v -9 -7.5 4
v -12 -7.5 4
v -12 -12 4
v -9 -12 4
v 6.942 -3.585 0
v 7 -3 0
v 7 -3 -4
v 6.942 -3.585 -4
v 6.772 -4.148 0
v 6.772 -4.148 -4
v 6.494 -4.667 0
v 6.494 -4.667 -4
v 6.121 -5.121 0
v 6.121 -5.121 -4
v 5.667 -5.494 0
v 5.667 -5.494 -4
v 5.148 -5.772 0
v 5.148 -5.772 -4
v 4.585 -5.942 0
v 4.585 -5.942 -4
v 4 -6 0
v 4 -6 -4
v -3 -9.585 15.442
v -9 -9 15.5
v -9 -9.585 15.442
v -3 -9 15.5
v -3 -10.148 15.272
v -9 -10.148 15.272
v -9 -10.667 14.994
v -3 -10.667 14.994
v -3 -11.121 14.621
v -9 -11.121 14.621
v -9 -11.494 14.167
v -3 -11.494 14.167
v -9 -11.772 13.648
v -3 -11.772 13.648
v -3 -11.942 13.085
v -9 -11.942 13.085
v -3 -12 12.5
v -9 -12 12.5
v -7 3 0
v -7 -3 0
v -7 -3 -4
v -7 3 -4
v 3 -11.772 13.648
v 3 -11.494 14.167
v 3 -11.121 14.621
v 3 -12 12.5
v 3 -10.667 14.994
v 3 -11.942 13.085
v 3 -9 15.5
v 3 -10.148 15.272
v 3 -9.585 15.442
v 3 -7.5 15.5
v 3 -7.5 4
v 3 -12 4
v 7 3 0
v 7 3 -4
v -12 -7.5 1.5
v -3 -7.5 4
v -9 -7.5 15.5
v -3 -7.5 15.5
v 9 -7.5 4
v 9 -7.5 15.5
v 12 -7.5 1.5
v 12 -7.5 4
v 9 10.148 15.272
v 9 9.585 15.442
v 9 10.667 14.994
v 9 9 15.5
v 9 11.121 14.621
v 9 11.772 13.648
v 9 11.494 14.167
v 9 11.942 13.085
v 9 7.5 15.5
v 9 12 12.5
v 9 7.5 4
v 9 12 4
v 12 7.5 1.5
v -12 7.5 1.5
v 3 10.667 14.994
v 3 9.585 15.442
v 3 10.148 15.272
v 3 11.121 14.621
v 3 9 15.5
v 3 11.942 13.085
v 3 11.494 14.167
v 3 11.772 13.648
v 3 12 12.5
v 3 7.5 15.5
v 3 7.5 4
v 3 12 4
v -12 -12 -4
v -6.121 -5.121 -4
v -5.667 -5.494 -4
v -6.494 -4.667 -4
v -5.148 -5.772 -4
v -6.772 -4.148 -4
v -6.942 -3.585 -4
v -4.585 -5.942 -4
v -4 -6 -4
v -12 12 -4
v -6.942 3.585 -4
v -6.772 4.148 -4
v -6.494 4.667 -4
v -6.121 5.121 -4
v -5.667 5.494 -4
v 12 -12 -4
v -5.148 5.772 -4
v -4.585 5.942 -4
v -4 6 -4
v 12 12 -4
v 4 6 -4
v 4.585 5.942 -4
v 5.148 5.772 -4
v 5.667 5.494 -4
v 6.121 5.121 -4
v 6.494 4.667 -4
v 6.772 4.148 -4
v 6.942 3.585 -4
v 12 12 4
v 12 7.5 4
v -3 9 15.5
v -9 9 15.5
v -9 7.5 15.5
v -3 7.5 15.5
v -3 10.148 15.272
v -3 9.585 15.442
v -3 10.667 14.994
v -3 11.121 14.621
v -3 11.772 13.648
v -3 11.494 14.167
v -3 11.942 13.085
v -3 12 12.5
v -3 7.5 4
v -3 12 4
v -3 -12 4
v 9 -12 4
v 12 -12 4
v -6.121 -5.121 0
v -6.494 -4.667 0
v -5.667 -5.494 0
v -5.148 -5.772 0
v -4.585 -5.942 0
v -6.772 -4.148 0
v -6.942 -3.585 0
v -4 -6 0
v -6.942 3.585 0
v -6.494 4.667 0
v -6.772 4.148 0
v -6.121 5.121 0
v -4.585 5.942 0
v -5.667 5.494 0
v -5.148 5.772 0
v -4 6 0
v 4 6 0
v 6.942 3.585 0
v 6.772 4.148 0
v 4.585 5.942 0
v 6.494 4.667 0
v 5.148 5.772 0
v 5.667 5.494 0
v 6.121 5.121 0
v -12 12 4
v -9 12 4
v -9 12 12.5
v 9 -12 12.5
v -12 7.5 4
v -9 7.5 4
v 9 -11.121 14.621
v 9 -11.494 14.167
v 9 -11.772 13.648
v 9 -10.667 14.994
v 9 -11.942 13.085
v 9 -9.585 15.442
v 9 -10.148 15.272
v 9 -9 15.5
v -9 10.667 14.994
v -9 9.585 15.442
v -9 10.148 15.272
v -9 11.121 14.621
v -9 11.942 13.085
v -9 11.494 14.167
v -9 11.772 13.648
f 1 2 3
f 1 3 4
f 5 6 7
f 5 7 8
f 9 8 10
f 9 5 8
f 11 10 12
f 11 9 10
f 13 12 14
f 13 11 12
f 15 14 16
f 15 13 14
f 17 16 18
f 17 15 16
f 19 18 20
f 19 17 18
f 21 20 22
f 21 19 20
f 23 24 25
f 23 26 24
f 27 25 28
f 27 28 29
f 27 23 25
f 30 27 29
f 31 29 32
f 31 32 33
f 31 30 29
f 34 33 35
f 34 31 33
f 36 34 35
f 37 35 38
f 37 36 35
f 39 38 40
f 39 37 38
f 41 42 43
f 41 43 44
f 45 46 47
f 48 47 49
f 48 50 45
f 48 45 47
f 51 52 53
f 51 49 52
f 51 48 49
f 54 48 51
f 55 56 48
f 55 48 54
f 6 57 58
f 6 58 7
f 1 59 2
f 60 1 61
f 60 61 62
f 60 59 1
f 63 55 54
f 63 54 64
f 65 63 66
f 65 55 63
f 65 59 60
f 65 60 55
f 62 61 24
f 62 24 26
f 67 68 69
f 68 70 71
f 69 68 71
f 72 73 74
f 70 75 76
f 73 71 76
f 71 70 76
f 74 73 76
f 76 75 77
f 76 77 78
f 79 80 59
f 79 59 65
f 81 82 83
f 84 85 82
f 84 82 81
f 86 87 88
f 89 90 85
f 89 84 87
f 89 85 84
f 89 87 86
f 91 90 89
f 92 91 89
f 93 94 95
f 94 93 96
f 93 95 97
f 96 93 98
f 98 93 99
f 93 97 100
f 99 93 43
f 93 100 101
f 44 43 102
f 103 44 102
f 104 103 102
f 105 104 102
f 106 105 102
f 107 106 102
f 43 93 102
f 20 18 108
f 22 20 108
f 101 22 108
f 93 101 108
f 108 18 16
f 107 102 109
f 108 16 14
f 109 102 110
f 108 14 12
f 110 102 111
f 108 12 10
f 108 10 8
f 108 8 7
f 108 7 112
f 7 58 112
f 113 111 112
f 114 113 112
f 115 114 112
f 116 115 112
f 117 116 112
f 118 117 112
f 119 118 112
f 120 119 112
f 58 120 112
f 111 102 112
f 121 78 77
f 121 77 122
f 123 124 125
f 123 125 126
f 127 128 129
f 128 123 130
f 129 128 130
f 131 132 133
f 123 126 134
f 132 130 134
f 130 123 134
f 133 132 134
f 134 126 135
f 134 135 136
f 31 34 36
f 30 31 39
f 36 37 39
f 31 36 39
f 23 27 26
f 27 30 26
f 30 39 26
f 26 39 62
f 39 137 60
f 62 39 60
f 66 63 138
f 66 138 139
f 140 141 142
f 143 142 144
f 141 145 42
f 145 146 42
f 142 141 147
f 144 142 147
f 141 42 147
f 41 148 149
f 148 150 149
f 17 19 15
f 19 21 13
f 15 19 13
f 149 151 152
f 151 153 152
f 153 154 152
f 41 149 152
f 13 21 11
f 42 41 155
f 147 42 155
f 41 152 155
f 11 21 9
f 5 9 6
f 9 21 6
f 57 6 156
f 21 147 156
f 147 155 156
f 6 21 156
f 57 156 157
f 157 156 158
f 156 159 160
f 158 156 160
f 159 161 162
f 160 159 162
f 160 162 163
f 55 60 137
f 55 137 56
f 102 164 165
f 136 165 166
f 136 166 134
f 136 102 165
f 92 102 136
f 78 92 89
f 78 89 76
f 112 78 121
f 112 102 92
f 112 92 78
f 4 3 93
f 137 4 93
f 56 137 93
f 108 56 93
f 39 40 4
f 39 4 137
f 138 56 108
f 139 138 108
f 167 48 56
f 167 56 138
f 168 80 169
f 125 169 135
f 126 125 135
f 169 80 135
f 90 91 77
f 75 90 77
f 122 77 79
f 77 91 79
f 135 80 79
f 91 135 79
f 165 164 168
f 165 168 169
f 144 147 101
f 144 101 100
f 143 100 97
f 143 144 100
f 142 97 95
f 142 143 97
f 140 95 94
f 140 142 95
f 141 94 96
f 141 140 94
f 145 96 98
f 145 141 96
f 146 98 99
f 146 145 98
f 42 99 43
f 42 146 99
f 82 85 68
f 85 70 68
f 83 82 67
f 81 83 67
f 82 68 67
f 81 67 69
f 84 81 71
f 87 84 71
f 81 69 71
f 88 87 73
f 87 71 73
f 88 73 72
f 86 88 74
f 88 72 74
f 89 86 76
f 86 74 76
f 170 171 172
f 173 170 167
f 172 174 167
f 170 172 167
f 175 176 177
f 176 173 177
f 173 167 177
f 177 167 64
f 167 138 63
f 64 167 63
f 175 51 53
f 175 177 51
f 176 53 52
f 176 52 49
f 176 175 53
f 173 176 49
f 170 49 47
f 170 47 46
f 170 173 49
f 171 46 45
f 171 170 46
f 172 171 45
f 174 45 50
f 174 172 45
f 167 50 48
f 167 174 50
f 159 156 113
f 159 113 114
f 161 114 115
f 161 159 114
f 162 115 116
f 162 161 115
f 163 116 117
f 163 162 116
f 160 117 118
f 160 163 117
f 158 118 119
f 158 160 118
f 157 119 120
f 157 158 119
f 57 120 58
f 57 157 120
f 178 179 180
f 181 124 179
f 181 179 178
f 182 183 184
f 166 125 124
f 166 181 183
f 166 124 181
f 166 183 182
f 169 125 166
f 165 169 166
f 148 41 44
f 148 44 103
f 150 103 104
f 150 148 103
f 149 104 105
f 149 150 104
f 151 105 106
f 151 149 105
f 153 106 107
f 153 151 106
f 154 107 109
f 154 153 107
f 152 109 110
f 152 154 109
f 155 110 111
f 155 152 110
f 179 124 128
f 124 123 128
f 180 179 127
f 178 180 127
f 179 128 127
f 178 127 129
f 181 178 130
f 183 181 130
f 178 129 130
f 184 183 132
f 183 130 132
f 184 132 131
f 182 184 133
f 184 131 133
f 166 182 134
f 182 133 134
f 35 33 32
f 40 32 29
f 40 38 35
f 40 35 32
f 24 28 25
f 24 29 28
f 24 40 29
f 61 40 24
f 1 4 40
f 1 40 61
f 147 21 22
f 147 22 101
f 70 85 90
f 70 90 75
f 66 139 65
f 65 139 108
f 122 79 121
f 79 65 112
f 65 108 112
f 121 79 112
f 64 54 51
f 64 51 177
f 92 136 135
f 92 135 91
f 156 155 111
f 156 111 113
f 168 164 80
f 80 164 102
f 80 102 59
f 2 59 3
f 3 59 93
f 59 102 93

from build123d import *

# Parameters (mm, degrees)
F0_W     = 3
F0_H     = 4.5
F0_W_2   = 6
F1_DEPTH = 4
F2_DEPTH = 1.5
F3_DEPTH = 4
F4_DEPTH = 15.5
F5_R     = 3


with BuildPart() as f1:
    # F0 (on Top) → F1 (new body)
    with BuildSketch(Plane.XY):
        Polygon((12, -7.5), (12, 7.5), (9, 7.5), (3, 7.5), (-3, 7.5), (-9, 7.5), (-12, 7.5), (-12, -7.5), (-9, -7.5), (-3, -7.5), (3, -7.5), (9, -7.5), align=None)
        with BuildLine():
            ThreePointArc((7, -3), (6.1213203436, -5.1213203436), (4, -6))
            Line((4, -6), (-4, -6))
            ThreePointArc((-4, -6), (-6.1213203436, -5.1213203436), (-7, -3))
            Line((-7, -3), (-7, 3))
            ThreePointArc((-7, 3), (-6.1213203436, 5.1213203436), (-4, 6))
            Line((-4, 6), (4, 6))
            ThreePointArc((4, 6), (6.1213203436, 5.1213203436), (7, 3))
            Line((7, 3), (7, -3))
        make_face(mode=Mode.SUBTRACT)
        with Locations((10.5, -9.75)):
            Rectangle(F0_W, F0_H)
        with Locations((6, -9.75)):
            Rectangle(F0_W_2, F0_H)
        with Locations((0, -9.75)):
            Rectangle(F0_W_2, F0_H)
        with Locations((-6, -9.75)):
            Rectangle(F0_W_2, F0_H)
        with Locations((-10.5, -9.75)):
            Rectangle(F0_W, F0_H)
        with Locations((-10.5, 9.75)):
            Rectangle(F0_W, F0_H)
        with Locations((-6, 9.75)):
            Rectangle(F0_W_2, F0_H)
        with Locations((0, 9.75)):
            Rectangle(F0_W_2, F0_H)
        with Locations((6, 9.75)):
            Rectangle(F0_W_2, F0_H)
        with Locations((10.5, 9.75)):
            Rectangle(F0_W, F0_H)
    extrude(amount=-F1_DEPTH)

    # F0 (on Top) → F2 (join)
    with BuildSketch(Plane.XY):
        Polygon((12, -7.5), (12, 7.5), (9, 7.5), (3, 7.5), (-3, 7.5), (-9, 7.5), (-12, 7.5), (-12, -7.5), (-9, -7.5), (-3, -7.5), (3, -7.5), (9, -7.5), align=None)
        with BuildLine():
            ThreePointArc((7, -3), (6.1213203436, -5.1213203436), (4, -6))
            Line((4, -6), (-4, -6))
            ThreePointArc((-4, -6), (-6.1213203436, -5.1213203436), (-7, -3))
            Line((-7, -3), (-7, 3))
            ThreePointArc((-7, 3), (-6.1213203436, 5.1213203436), (-4, 6))
            Line((-4, 6), (4, 6))
            ThreePointArc((4, 6), (6.1213203436, 5.1213203436), (7, 3))
            Line((7, 3), (7, -3))
        make_face(mode=Mode.SUBTRACT)
        with BuildLine():
            Line((-4, -6), (4, -6))
            ThreePointArc((4, -6), (6.1213203436, -5.1213203436), (7, -3))
            Line((7, -3), (7, 3))
            ThreePointArc((7, 3), (6.1213203436, 5.1213203436), (4, 6))
            Line((4, 6), (-4, 6))
            ThreePointArc((-4, 6), (-6.1213203436, 5.1213203436), (-7, 3))
            Line((-7, 3), (-7, -3))
            ThreePointArc((-7, -3), (-6.1213203436, -5.1213203436), (-4, -6))
        make_face()
    extrude(amount=F2_DEPTH)

    # F0 (on Top) → F3 (join)
    with BuildSketch(Plane.XY):
        with Locations((10.5, 9.75)):
            Rectangle(F0_W, F0_H)
        with Locations((0, 9.75)):
            Rectangle(F0_W_2, F0_H)
        with Locations((-10.5, 9.75)):
            Rectangle(F0_W, F0_H)
        with Locations((-10.5, -9.75)):
            Rectangle(F0_W, F0_H)
        with Locations((0, -9.75)):
            Rectangle(F0_W_2, F0_H)
        with Locations((10.5, -9.75)):
            Rectangle(F0_W, F0_H)
    extrude(amount=F3_DEPTH)

    # F0 (on Top) → F4 (join)
    with BuildSketch(Plane.XY):
        with Locations((-6, 9.75)):
            Rectangle(F0_W_2, F0_H)
        with Locations((6, 9.75)):
            Rectangle(F0_W_2, F0_H)
        with Locations((6, -9.75)):
            Rectangle(F0_W_2, F0_H)
        with Locations((-6, -9.75)):
            Rectangle(F0_W_2, F0_H)
    extrude(amount=F4_DEPTH)

    # F5
    f5_edges = [f1.edges().sort_by_distance(p)[0] for p in [
        (6, 12, 15.5),
        (-6, 12, 15.5),
        (6, -12, 15.5),
        (-6, -12, 15.5),
    ]]
    fillet(f5_edges, radius=F5_R)


solid = f1.part
